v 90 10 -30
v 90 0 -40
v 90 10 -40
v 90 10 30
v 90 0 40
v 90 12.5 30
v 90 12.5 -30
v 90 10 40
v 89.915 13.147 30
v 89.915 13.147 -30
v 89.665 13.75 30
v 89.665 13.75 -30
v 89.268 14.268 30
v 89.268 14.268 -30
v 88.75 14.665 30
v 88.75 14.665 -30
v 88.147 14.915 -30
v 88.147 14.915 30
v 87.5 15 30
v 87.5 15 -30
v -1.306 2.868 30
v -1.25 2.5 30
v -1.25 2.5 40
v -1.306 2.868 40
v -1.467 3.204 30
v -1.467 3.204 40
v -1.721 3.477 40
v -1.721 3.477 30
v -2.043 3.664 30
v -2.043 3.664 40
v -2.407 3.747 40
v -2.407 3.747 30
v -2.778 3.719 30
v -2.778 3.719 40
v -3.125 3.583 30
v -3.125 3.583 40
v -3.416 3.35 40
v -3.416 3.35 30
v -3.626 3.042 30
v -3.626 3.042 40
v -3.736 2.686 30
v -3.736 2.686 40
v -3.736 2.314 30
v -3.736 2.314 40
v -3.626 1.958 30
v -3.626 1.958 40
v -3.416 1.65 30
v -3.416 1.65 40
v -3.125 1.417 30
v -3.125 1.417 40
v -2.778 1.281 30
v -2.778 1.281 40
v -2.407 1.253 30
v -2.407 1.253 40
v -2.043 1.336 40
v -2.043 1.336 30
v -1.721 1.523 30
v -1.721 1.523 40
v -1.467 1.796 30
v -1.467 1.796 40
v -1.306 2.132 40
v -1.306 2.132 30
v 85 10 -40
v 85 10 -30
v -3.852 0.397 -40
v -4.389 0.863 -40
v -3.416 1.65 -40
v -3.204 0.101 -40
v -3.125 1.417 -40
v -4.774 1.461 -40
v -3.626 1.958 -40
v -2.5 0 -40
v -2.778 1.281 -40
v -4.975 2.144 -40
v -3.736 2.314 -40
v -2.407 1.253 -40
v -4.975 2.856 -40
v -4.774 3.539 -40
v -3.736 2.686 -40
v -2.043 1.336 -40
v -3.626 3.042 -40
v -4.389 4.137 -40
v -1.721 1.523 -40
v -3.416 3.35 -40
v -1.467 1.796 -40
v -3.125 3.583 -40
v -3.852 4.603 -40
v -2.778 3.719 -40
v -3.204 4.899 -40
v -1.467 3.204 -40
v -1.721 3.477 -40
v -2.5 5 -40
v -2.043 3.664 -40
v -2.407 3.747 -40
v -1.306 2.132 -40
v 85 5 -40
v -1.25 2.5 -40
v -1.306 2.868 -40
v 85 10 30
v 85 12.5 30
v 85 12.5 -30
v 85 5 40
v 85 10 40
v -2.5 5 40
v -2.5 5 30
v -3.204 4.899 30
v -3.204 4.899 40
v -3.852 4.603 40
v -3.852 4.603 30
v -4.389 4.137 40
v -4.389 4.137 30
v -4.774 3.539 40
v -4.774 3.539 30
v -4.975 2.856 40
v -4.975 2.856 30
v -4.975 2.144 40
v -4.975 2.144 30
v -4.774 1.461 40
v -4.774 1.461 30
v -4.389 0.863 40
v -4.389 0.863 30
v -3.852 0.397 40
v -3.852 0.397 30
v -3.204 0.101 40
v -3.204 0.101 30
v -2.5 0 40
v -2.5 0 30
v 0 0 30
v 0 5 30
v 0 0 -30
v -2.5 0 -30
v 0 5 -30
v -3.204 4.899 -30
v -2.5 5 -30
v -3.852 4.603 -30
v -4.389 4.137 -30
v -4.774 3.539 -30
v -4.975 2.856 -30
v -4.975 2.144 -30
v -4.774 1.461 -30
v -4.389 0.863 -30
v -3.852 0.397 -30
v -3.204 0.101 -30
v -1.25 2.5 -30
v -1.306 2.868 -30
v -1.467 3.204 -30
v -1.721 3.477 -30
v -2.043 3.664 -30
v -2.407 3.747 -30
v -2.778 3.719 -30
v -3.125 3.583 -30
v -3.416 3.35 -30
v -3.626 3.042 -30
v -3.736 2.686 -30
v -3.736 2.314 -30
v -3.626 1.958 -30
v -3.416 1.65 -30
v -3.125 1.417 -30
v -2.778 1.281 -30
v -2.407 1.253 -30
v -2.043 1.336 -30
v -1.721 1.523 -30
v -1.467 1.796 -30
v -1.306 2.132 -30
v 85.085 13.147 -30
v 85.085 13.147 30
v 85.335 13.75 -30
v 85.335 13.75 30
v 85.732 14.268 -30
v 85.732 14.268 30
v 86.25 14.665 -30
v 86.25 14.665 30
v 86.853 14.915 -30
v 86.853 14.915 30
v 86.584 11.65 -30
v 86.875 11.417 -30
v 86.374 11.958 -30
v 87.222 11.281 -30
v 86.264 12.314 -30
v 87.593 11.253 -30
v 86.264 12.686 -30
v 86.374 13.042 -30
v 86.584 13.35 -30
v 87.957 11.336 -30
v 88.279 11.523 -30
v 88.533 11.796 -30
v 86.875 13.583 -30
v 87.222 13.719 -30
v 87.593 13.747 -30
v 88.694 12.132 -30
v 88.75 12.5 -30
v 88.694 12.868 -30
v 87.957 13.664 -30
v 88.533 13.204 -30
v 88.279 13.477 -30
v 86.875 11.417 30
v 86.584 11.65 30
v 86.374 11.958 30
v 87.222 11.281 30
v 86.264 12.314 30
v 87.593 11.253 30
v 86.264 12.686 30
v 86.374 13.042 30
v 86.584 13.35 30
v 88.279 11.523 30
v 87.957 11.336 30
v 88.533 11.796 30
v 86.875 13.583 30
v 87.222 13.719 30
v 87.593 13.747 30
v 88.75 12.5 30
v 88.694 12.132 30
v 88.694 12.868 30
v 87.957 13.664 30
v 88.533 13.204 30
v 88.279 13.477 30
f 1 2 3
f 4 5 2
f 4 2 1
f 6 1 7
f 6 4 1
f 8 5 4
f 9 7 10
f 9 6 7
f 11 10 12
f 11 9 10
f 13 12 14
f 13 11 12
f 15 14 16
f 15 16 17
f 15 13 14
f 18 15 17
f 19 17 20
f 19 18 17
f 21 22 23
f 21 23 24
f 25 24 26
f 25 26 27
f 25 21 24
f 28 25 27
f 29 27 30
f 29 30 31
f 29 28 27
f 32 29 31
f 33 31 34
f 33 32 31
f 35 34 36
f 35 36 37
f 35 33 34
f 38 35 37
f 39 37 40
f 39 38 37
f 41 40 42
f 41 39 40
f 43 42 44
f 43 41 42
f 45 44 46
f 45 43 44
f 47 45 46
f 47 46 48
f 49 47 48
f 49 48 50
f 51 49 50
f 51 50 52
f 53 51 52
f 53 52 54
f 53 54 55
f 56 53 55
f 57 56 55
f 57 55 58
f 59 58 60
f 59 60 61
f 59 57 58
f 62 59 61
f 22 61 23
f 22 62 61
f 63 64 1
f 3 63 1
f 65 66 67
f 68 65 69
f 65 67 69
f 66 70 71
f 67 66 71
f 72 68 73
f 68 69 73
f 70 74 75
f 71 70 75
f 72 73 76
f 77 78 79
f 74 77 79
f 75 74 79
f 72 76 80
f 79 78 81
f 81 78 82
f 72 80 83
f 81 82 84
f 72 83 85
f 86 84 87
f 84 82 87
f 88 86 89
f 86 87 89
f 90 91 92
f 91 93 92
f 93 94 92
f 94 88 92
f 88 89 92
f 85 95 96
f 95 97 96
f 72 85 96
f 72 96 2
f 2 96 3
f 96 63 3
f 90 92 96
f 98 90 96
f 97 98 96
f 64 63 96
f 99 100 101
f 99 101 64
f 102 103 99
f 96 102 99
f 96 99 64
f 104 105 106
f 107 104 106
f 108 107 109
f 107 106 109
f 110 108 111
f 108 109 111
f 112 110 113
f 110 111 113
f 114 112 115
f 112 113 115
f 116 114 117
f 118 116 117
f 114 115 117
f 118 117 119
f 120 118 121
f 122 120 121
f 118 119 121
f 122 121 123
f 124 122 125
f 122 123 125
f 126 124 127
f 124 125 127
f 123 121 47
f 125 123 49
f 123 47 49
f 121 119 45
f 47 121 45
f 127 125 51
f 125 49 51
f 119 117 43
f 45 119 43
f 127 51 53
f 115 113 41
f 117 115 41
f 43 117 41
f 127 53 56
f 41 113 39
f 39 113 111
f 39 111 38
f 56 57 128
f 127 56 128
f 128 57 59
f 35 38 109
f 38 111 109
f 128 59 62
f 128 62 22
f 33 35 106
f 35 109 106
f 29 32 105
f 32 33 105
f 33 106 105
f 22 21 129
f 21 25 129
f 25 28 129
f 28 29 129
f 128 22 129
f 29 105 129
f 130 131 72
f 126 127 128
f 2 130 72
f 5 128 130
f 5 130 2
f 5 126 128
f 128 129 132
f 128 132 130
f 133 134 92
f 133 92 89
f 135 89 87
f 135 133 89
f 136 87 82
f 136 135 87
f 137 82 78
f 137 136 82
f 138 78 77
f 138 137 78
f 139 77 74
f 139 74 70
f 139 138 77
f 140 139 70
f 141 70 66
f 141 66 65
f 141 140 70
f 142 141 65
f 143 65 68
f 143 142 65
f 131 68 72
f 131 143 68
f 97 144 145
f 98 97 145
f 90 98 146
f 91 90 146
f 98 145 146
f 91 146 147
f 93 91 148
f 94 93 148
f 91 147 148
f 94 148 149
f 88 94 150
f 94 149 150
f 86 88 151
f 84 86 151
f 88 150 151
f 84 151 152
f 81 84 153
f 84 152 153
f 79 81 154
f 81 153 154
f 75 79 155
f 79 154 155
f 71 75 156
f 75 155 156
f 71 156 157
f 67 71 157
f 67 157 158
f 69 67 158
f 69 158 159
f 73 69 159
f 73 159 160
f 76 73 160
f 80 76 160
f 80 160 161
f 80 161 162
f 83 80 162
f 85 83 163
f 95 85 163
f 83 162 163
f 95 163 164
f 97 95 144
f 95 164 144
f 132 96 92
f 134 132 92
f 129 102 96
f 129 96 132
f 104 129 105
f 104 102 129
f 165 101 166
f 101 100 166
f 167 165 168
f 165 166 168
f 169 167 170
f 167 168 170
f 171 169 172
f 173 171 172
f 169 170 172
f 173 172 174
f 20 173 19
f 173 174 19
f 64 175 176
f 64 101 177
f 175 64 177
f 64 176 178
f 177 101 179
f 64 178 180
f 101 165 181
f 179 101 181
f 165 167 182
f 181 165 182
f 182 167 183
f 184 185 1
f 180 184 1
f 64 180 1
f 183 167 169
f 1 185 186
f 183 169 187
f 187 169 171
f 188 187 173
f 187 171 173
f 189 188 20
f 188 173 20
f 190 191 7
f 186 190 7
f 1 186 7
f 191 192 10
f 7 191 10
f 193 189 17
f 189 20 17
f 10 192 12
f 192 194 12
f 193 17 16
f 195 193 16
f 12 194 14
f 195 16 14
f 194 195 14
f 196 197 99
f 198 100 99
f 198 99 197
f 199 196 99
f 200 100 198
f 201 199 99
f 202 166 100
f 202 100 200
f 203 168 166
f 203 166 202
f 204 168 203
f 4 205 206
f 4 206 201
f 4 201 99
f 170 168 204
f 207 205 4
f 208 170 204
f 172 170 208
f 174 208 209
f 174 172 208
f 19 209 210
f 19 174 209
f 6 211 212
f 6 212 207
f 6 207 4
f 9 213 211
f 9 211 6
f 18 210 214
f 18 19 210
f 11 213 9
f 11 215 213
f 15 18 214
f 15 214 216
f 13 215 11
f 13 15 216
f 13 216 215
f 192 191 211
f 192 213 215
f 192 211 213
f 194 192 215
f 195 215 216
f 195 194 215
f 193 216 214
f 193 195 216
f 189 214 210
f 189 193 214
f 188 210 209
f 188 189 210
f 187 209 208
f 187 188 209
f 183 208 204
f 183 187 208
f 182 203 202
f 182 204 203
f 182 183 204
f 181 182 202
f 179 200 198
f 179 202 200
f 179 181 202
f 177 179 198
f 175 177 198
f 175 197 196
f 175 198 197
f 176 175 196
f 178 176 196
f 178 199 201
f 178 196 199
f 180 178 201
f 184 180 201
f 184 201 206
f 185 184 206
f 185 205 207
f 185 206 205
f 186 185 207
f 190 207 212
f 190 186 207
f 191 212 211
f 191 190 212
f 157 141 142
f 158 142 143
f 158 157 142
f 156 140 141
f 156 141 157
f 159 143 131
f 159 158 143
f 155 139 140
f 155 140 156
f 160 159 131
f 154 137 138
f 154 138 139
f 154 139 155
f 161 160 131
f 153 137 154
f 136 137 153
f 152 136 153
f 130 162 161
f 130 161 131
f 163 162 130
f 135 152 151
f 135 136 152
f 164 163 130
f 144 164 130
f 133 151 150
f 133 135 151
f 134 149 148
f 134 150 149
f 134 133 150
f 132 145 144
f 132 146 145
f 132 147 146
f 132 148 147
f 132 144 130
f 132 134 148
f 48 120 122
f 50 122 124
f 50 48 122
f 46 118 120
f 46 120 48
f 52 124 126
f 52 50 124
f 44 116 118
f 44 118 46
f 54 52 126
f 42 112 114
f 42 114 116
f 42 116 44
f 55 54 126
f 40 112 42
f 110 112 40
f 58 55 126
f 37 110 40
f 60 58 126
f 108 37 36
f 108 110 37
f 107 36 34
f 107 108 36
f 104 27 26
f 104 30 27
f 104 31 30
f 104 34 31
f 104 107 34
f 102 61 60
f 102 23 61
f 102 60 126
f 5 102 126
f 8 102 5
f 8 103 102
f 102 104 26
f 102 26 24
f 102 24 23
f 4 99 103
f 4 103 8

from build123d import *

# Parameters (mm, degrees)
BOSS_EXTRUDE1_DEPTH     = 40
BOSS_EXTRUDE2_START     = 30
SKETCH2_R               = 1.25
BOSS_EXTRUDE2_DEPTH     = 10
CUT_EXTRUDE1_START      = -30
SKETCH3_W               = 5
SKETCH3_H               = 5
CUT_EXTRUDE1_DEPTH      = 10
CUT_EXTRUDE2_DEPTH      = 100.624294226
CUT_EXTRUDE2_DEPTH_BACK = 100.624294226
SKETCH4_R               = 1.25
FILLET1_R               = 2.5


with BuildPart() as part:
    # Sketch1 → Boss-Extrude1 (new, symmetric)
    with BuildSketch(Plane.XY):
        Polygon((0, 0), (90, 0), (90, 15), (85, 15), (85, 5), (0, 5), align=None)
    extrude(amount=BOSS_EXTRUDE1_DEPTH, both=True)

    # Sketch2 → Boss-Extrude2 (add)
    with BuildSketch(Plane.XY.offset(BOSS_EXTRUDE2_START)):
        with BuildLine():
            Line((0, 5), (-2.5, 5))
            ThreePointArc((-2.5, 5), (-5, 2.5), (-2.5, 0))
            Line((-2.5, 0), (0, 0))
            Line((0, 0), (0, 5))
        make_face()
        with Locations((-2.5, 2.5)):
            Circle(SKETCH2_R, mode=Mode.SUBTRACT)
    boss_extrude2 = extrude(amount=BOSS_EXTRUDE2_DEPTH)

    # Mirror2: Boss-Extrude2 across plane
    add(boss_extrude2.mirror(Plane.XY))

    # Sketch3 → Cut-Extrude1 (cut)
    with BuildSketch(Plane.XY.offset(CUT_EXTRUDE1_START)):
        with Locations((87.5, 12.5)):
            Rectangle(SKETCH3_W, SKETCH3_H)
    cut_extrude1 = extrude(amount=-CUT_EXTRUDE1_DEPTH, mode=Mode.SUBTRACT)

    # Mirror3: Cut-Extrude1 across plane
    add(cut_extrude1.mirror(Plane.XY), mode=Mode.SUBTRACT)

    # Sketch4 → Cut-Extrude2 (cut, two sides: drawn at the far end of the back side and taken through both)
    with BuildSketch(Plane.XY.offset(-CUT_EXTRUDE2_DEPTH_BACK)):
        with Locations((87.5, 12.5)):
            Circle(SKETCH4_R)
    extrude(amount=CUT_EXTRUDE2_DEPTH + CUT_EXTRUDE2_DEPTH_BACK, mode=Mode.SUBTRACT)

    # Fillet1
    fillet1_edges = [part.edges().sort_by_distance(p)[0] for p in [
        (85, 15, 0),
        (90, 15, 0),
    ]]
    fillet(fillet1_edges, radius=FILLET1_R - 0.0001)  # a hair under: the kernel refuses the full size


solid = part.part
